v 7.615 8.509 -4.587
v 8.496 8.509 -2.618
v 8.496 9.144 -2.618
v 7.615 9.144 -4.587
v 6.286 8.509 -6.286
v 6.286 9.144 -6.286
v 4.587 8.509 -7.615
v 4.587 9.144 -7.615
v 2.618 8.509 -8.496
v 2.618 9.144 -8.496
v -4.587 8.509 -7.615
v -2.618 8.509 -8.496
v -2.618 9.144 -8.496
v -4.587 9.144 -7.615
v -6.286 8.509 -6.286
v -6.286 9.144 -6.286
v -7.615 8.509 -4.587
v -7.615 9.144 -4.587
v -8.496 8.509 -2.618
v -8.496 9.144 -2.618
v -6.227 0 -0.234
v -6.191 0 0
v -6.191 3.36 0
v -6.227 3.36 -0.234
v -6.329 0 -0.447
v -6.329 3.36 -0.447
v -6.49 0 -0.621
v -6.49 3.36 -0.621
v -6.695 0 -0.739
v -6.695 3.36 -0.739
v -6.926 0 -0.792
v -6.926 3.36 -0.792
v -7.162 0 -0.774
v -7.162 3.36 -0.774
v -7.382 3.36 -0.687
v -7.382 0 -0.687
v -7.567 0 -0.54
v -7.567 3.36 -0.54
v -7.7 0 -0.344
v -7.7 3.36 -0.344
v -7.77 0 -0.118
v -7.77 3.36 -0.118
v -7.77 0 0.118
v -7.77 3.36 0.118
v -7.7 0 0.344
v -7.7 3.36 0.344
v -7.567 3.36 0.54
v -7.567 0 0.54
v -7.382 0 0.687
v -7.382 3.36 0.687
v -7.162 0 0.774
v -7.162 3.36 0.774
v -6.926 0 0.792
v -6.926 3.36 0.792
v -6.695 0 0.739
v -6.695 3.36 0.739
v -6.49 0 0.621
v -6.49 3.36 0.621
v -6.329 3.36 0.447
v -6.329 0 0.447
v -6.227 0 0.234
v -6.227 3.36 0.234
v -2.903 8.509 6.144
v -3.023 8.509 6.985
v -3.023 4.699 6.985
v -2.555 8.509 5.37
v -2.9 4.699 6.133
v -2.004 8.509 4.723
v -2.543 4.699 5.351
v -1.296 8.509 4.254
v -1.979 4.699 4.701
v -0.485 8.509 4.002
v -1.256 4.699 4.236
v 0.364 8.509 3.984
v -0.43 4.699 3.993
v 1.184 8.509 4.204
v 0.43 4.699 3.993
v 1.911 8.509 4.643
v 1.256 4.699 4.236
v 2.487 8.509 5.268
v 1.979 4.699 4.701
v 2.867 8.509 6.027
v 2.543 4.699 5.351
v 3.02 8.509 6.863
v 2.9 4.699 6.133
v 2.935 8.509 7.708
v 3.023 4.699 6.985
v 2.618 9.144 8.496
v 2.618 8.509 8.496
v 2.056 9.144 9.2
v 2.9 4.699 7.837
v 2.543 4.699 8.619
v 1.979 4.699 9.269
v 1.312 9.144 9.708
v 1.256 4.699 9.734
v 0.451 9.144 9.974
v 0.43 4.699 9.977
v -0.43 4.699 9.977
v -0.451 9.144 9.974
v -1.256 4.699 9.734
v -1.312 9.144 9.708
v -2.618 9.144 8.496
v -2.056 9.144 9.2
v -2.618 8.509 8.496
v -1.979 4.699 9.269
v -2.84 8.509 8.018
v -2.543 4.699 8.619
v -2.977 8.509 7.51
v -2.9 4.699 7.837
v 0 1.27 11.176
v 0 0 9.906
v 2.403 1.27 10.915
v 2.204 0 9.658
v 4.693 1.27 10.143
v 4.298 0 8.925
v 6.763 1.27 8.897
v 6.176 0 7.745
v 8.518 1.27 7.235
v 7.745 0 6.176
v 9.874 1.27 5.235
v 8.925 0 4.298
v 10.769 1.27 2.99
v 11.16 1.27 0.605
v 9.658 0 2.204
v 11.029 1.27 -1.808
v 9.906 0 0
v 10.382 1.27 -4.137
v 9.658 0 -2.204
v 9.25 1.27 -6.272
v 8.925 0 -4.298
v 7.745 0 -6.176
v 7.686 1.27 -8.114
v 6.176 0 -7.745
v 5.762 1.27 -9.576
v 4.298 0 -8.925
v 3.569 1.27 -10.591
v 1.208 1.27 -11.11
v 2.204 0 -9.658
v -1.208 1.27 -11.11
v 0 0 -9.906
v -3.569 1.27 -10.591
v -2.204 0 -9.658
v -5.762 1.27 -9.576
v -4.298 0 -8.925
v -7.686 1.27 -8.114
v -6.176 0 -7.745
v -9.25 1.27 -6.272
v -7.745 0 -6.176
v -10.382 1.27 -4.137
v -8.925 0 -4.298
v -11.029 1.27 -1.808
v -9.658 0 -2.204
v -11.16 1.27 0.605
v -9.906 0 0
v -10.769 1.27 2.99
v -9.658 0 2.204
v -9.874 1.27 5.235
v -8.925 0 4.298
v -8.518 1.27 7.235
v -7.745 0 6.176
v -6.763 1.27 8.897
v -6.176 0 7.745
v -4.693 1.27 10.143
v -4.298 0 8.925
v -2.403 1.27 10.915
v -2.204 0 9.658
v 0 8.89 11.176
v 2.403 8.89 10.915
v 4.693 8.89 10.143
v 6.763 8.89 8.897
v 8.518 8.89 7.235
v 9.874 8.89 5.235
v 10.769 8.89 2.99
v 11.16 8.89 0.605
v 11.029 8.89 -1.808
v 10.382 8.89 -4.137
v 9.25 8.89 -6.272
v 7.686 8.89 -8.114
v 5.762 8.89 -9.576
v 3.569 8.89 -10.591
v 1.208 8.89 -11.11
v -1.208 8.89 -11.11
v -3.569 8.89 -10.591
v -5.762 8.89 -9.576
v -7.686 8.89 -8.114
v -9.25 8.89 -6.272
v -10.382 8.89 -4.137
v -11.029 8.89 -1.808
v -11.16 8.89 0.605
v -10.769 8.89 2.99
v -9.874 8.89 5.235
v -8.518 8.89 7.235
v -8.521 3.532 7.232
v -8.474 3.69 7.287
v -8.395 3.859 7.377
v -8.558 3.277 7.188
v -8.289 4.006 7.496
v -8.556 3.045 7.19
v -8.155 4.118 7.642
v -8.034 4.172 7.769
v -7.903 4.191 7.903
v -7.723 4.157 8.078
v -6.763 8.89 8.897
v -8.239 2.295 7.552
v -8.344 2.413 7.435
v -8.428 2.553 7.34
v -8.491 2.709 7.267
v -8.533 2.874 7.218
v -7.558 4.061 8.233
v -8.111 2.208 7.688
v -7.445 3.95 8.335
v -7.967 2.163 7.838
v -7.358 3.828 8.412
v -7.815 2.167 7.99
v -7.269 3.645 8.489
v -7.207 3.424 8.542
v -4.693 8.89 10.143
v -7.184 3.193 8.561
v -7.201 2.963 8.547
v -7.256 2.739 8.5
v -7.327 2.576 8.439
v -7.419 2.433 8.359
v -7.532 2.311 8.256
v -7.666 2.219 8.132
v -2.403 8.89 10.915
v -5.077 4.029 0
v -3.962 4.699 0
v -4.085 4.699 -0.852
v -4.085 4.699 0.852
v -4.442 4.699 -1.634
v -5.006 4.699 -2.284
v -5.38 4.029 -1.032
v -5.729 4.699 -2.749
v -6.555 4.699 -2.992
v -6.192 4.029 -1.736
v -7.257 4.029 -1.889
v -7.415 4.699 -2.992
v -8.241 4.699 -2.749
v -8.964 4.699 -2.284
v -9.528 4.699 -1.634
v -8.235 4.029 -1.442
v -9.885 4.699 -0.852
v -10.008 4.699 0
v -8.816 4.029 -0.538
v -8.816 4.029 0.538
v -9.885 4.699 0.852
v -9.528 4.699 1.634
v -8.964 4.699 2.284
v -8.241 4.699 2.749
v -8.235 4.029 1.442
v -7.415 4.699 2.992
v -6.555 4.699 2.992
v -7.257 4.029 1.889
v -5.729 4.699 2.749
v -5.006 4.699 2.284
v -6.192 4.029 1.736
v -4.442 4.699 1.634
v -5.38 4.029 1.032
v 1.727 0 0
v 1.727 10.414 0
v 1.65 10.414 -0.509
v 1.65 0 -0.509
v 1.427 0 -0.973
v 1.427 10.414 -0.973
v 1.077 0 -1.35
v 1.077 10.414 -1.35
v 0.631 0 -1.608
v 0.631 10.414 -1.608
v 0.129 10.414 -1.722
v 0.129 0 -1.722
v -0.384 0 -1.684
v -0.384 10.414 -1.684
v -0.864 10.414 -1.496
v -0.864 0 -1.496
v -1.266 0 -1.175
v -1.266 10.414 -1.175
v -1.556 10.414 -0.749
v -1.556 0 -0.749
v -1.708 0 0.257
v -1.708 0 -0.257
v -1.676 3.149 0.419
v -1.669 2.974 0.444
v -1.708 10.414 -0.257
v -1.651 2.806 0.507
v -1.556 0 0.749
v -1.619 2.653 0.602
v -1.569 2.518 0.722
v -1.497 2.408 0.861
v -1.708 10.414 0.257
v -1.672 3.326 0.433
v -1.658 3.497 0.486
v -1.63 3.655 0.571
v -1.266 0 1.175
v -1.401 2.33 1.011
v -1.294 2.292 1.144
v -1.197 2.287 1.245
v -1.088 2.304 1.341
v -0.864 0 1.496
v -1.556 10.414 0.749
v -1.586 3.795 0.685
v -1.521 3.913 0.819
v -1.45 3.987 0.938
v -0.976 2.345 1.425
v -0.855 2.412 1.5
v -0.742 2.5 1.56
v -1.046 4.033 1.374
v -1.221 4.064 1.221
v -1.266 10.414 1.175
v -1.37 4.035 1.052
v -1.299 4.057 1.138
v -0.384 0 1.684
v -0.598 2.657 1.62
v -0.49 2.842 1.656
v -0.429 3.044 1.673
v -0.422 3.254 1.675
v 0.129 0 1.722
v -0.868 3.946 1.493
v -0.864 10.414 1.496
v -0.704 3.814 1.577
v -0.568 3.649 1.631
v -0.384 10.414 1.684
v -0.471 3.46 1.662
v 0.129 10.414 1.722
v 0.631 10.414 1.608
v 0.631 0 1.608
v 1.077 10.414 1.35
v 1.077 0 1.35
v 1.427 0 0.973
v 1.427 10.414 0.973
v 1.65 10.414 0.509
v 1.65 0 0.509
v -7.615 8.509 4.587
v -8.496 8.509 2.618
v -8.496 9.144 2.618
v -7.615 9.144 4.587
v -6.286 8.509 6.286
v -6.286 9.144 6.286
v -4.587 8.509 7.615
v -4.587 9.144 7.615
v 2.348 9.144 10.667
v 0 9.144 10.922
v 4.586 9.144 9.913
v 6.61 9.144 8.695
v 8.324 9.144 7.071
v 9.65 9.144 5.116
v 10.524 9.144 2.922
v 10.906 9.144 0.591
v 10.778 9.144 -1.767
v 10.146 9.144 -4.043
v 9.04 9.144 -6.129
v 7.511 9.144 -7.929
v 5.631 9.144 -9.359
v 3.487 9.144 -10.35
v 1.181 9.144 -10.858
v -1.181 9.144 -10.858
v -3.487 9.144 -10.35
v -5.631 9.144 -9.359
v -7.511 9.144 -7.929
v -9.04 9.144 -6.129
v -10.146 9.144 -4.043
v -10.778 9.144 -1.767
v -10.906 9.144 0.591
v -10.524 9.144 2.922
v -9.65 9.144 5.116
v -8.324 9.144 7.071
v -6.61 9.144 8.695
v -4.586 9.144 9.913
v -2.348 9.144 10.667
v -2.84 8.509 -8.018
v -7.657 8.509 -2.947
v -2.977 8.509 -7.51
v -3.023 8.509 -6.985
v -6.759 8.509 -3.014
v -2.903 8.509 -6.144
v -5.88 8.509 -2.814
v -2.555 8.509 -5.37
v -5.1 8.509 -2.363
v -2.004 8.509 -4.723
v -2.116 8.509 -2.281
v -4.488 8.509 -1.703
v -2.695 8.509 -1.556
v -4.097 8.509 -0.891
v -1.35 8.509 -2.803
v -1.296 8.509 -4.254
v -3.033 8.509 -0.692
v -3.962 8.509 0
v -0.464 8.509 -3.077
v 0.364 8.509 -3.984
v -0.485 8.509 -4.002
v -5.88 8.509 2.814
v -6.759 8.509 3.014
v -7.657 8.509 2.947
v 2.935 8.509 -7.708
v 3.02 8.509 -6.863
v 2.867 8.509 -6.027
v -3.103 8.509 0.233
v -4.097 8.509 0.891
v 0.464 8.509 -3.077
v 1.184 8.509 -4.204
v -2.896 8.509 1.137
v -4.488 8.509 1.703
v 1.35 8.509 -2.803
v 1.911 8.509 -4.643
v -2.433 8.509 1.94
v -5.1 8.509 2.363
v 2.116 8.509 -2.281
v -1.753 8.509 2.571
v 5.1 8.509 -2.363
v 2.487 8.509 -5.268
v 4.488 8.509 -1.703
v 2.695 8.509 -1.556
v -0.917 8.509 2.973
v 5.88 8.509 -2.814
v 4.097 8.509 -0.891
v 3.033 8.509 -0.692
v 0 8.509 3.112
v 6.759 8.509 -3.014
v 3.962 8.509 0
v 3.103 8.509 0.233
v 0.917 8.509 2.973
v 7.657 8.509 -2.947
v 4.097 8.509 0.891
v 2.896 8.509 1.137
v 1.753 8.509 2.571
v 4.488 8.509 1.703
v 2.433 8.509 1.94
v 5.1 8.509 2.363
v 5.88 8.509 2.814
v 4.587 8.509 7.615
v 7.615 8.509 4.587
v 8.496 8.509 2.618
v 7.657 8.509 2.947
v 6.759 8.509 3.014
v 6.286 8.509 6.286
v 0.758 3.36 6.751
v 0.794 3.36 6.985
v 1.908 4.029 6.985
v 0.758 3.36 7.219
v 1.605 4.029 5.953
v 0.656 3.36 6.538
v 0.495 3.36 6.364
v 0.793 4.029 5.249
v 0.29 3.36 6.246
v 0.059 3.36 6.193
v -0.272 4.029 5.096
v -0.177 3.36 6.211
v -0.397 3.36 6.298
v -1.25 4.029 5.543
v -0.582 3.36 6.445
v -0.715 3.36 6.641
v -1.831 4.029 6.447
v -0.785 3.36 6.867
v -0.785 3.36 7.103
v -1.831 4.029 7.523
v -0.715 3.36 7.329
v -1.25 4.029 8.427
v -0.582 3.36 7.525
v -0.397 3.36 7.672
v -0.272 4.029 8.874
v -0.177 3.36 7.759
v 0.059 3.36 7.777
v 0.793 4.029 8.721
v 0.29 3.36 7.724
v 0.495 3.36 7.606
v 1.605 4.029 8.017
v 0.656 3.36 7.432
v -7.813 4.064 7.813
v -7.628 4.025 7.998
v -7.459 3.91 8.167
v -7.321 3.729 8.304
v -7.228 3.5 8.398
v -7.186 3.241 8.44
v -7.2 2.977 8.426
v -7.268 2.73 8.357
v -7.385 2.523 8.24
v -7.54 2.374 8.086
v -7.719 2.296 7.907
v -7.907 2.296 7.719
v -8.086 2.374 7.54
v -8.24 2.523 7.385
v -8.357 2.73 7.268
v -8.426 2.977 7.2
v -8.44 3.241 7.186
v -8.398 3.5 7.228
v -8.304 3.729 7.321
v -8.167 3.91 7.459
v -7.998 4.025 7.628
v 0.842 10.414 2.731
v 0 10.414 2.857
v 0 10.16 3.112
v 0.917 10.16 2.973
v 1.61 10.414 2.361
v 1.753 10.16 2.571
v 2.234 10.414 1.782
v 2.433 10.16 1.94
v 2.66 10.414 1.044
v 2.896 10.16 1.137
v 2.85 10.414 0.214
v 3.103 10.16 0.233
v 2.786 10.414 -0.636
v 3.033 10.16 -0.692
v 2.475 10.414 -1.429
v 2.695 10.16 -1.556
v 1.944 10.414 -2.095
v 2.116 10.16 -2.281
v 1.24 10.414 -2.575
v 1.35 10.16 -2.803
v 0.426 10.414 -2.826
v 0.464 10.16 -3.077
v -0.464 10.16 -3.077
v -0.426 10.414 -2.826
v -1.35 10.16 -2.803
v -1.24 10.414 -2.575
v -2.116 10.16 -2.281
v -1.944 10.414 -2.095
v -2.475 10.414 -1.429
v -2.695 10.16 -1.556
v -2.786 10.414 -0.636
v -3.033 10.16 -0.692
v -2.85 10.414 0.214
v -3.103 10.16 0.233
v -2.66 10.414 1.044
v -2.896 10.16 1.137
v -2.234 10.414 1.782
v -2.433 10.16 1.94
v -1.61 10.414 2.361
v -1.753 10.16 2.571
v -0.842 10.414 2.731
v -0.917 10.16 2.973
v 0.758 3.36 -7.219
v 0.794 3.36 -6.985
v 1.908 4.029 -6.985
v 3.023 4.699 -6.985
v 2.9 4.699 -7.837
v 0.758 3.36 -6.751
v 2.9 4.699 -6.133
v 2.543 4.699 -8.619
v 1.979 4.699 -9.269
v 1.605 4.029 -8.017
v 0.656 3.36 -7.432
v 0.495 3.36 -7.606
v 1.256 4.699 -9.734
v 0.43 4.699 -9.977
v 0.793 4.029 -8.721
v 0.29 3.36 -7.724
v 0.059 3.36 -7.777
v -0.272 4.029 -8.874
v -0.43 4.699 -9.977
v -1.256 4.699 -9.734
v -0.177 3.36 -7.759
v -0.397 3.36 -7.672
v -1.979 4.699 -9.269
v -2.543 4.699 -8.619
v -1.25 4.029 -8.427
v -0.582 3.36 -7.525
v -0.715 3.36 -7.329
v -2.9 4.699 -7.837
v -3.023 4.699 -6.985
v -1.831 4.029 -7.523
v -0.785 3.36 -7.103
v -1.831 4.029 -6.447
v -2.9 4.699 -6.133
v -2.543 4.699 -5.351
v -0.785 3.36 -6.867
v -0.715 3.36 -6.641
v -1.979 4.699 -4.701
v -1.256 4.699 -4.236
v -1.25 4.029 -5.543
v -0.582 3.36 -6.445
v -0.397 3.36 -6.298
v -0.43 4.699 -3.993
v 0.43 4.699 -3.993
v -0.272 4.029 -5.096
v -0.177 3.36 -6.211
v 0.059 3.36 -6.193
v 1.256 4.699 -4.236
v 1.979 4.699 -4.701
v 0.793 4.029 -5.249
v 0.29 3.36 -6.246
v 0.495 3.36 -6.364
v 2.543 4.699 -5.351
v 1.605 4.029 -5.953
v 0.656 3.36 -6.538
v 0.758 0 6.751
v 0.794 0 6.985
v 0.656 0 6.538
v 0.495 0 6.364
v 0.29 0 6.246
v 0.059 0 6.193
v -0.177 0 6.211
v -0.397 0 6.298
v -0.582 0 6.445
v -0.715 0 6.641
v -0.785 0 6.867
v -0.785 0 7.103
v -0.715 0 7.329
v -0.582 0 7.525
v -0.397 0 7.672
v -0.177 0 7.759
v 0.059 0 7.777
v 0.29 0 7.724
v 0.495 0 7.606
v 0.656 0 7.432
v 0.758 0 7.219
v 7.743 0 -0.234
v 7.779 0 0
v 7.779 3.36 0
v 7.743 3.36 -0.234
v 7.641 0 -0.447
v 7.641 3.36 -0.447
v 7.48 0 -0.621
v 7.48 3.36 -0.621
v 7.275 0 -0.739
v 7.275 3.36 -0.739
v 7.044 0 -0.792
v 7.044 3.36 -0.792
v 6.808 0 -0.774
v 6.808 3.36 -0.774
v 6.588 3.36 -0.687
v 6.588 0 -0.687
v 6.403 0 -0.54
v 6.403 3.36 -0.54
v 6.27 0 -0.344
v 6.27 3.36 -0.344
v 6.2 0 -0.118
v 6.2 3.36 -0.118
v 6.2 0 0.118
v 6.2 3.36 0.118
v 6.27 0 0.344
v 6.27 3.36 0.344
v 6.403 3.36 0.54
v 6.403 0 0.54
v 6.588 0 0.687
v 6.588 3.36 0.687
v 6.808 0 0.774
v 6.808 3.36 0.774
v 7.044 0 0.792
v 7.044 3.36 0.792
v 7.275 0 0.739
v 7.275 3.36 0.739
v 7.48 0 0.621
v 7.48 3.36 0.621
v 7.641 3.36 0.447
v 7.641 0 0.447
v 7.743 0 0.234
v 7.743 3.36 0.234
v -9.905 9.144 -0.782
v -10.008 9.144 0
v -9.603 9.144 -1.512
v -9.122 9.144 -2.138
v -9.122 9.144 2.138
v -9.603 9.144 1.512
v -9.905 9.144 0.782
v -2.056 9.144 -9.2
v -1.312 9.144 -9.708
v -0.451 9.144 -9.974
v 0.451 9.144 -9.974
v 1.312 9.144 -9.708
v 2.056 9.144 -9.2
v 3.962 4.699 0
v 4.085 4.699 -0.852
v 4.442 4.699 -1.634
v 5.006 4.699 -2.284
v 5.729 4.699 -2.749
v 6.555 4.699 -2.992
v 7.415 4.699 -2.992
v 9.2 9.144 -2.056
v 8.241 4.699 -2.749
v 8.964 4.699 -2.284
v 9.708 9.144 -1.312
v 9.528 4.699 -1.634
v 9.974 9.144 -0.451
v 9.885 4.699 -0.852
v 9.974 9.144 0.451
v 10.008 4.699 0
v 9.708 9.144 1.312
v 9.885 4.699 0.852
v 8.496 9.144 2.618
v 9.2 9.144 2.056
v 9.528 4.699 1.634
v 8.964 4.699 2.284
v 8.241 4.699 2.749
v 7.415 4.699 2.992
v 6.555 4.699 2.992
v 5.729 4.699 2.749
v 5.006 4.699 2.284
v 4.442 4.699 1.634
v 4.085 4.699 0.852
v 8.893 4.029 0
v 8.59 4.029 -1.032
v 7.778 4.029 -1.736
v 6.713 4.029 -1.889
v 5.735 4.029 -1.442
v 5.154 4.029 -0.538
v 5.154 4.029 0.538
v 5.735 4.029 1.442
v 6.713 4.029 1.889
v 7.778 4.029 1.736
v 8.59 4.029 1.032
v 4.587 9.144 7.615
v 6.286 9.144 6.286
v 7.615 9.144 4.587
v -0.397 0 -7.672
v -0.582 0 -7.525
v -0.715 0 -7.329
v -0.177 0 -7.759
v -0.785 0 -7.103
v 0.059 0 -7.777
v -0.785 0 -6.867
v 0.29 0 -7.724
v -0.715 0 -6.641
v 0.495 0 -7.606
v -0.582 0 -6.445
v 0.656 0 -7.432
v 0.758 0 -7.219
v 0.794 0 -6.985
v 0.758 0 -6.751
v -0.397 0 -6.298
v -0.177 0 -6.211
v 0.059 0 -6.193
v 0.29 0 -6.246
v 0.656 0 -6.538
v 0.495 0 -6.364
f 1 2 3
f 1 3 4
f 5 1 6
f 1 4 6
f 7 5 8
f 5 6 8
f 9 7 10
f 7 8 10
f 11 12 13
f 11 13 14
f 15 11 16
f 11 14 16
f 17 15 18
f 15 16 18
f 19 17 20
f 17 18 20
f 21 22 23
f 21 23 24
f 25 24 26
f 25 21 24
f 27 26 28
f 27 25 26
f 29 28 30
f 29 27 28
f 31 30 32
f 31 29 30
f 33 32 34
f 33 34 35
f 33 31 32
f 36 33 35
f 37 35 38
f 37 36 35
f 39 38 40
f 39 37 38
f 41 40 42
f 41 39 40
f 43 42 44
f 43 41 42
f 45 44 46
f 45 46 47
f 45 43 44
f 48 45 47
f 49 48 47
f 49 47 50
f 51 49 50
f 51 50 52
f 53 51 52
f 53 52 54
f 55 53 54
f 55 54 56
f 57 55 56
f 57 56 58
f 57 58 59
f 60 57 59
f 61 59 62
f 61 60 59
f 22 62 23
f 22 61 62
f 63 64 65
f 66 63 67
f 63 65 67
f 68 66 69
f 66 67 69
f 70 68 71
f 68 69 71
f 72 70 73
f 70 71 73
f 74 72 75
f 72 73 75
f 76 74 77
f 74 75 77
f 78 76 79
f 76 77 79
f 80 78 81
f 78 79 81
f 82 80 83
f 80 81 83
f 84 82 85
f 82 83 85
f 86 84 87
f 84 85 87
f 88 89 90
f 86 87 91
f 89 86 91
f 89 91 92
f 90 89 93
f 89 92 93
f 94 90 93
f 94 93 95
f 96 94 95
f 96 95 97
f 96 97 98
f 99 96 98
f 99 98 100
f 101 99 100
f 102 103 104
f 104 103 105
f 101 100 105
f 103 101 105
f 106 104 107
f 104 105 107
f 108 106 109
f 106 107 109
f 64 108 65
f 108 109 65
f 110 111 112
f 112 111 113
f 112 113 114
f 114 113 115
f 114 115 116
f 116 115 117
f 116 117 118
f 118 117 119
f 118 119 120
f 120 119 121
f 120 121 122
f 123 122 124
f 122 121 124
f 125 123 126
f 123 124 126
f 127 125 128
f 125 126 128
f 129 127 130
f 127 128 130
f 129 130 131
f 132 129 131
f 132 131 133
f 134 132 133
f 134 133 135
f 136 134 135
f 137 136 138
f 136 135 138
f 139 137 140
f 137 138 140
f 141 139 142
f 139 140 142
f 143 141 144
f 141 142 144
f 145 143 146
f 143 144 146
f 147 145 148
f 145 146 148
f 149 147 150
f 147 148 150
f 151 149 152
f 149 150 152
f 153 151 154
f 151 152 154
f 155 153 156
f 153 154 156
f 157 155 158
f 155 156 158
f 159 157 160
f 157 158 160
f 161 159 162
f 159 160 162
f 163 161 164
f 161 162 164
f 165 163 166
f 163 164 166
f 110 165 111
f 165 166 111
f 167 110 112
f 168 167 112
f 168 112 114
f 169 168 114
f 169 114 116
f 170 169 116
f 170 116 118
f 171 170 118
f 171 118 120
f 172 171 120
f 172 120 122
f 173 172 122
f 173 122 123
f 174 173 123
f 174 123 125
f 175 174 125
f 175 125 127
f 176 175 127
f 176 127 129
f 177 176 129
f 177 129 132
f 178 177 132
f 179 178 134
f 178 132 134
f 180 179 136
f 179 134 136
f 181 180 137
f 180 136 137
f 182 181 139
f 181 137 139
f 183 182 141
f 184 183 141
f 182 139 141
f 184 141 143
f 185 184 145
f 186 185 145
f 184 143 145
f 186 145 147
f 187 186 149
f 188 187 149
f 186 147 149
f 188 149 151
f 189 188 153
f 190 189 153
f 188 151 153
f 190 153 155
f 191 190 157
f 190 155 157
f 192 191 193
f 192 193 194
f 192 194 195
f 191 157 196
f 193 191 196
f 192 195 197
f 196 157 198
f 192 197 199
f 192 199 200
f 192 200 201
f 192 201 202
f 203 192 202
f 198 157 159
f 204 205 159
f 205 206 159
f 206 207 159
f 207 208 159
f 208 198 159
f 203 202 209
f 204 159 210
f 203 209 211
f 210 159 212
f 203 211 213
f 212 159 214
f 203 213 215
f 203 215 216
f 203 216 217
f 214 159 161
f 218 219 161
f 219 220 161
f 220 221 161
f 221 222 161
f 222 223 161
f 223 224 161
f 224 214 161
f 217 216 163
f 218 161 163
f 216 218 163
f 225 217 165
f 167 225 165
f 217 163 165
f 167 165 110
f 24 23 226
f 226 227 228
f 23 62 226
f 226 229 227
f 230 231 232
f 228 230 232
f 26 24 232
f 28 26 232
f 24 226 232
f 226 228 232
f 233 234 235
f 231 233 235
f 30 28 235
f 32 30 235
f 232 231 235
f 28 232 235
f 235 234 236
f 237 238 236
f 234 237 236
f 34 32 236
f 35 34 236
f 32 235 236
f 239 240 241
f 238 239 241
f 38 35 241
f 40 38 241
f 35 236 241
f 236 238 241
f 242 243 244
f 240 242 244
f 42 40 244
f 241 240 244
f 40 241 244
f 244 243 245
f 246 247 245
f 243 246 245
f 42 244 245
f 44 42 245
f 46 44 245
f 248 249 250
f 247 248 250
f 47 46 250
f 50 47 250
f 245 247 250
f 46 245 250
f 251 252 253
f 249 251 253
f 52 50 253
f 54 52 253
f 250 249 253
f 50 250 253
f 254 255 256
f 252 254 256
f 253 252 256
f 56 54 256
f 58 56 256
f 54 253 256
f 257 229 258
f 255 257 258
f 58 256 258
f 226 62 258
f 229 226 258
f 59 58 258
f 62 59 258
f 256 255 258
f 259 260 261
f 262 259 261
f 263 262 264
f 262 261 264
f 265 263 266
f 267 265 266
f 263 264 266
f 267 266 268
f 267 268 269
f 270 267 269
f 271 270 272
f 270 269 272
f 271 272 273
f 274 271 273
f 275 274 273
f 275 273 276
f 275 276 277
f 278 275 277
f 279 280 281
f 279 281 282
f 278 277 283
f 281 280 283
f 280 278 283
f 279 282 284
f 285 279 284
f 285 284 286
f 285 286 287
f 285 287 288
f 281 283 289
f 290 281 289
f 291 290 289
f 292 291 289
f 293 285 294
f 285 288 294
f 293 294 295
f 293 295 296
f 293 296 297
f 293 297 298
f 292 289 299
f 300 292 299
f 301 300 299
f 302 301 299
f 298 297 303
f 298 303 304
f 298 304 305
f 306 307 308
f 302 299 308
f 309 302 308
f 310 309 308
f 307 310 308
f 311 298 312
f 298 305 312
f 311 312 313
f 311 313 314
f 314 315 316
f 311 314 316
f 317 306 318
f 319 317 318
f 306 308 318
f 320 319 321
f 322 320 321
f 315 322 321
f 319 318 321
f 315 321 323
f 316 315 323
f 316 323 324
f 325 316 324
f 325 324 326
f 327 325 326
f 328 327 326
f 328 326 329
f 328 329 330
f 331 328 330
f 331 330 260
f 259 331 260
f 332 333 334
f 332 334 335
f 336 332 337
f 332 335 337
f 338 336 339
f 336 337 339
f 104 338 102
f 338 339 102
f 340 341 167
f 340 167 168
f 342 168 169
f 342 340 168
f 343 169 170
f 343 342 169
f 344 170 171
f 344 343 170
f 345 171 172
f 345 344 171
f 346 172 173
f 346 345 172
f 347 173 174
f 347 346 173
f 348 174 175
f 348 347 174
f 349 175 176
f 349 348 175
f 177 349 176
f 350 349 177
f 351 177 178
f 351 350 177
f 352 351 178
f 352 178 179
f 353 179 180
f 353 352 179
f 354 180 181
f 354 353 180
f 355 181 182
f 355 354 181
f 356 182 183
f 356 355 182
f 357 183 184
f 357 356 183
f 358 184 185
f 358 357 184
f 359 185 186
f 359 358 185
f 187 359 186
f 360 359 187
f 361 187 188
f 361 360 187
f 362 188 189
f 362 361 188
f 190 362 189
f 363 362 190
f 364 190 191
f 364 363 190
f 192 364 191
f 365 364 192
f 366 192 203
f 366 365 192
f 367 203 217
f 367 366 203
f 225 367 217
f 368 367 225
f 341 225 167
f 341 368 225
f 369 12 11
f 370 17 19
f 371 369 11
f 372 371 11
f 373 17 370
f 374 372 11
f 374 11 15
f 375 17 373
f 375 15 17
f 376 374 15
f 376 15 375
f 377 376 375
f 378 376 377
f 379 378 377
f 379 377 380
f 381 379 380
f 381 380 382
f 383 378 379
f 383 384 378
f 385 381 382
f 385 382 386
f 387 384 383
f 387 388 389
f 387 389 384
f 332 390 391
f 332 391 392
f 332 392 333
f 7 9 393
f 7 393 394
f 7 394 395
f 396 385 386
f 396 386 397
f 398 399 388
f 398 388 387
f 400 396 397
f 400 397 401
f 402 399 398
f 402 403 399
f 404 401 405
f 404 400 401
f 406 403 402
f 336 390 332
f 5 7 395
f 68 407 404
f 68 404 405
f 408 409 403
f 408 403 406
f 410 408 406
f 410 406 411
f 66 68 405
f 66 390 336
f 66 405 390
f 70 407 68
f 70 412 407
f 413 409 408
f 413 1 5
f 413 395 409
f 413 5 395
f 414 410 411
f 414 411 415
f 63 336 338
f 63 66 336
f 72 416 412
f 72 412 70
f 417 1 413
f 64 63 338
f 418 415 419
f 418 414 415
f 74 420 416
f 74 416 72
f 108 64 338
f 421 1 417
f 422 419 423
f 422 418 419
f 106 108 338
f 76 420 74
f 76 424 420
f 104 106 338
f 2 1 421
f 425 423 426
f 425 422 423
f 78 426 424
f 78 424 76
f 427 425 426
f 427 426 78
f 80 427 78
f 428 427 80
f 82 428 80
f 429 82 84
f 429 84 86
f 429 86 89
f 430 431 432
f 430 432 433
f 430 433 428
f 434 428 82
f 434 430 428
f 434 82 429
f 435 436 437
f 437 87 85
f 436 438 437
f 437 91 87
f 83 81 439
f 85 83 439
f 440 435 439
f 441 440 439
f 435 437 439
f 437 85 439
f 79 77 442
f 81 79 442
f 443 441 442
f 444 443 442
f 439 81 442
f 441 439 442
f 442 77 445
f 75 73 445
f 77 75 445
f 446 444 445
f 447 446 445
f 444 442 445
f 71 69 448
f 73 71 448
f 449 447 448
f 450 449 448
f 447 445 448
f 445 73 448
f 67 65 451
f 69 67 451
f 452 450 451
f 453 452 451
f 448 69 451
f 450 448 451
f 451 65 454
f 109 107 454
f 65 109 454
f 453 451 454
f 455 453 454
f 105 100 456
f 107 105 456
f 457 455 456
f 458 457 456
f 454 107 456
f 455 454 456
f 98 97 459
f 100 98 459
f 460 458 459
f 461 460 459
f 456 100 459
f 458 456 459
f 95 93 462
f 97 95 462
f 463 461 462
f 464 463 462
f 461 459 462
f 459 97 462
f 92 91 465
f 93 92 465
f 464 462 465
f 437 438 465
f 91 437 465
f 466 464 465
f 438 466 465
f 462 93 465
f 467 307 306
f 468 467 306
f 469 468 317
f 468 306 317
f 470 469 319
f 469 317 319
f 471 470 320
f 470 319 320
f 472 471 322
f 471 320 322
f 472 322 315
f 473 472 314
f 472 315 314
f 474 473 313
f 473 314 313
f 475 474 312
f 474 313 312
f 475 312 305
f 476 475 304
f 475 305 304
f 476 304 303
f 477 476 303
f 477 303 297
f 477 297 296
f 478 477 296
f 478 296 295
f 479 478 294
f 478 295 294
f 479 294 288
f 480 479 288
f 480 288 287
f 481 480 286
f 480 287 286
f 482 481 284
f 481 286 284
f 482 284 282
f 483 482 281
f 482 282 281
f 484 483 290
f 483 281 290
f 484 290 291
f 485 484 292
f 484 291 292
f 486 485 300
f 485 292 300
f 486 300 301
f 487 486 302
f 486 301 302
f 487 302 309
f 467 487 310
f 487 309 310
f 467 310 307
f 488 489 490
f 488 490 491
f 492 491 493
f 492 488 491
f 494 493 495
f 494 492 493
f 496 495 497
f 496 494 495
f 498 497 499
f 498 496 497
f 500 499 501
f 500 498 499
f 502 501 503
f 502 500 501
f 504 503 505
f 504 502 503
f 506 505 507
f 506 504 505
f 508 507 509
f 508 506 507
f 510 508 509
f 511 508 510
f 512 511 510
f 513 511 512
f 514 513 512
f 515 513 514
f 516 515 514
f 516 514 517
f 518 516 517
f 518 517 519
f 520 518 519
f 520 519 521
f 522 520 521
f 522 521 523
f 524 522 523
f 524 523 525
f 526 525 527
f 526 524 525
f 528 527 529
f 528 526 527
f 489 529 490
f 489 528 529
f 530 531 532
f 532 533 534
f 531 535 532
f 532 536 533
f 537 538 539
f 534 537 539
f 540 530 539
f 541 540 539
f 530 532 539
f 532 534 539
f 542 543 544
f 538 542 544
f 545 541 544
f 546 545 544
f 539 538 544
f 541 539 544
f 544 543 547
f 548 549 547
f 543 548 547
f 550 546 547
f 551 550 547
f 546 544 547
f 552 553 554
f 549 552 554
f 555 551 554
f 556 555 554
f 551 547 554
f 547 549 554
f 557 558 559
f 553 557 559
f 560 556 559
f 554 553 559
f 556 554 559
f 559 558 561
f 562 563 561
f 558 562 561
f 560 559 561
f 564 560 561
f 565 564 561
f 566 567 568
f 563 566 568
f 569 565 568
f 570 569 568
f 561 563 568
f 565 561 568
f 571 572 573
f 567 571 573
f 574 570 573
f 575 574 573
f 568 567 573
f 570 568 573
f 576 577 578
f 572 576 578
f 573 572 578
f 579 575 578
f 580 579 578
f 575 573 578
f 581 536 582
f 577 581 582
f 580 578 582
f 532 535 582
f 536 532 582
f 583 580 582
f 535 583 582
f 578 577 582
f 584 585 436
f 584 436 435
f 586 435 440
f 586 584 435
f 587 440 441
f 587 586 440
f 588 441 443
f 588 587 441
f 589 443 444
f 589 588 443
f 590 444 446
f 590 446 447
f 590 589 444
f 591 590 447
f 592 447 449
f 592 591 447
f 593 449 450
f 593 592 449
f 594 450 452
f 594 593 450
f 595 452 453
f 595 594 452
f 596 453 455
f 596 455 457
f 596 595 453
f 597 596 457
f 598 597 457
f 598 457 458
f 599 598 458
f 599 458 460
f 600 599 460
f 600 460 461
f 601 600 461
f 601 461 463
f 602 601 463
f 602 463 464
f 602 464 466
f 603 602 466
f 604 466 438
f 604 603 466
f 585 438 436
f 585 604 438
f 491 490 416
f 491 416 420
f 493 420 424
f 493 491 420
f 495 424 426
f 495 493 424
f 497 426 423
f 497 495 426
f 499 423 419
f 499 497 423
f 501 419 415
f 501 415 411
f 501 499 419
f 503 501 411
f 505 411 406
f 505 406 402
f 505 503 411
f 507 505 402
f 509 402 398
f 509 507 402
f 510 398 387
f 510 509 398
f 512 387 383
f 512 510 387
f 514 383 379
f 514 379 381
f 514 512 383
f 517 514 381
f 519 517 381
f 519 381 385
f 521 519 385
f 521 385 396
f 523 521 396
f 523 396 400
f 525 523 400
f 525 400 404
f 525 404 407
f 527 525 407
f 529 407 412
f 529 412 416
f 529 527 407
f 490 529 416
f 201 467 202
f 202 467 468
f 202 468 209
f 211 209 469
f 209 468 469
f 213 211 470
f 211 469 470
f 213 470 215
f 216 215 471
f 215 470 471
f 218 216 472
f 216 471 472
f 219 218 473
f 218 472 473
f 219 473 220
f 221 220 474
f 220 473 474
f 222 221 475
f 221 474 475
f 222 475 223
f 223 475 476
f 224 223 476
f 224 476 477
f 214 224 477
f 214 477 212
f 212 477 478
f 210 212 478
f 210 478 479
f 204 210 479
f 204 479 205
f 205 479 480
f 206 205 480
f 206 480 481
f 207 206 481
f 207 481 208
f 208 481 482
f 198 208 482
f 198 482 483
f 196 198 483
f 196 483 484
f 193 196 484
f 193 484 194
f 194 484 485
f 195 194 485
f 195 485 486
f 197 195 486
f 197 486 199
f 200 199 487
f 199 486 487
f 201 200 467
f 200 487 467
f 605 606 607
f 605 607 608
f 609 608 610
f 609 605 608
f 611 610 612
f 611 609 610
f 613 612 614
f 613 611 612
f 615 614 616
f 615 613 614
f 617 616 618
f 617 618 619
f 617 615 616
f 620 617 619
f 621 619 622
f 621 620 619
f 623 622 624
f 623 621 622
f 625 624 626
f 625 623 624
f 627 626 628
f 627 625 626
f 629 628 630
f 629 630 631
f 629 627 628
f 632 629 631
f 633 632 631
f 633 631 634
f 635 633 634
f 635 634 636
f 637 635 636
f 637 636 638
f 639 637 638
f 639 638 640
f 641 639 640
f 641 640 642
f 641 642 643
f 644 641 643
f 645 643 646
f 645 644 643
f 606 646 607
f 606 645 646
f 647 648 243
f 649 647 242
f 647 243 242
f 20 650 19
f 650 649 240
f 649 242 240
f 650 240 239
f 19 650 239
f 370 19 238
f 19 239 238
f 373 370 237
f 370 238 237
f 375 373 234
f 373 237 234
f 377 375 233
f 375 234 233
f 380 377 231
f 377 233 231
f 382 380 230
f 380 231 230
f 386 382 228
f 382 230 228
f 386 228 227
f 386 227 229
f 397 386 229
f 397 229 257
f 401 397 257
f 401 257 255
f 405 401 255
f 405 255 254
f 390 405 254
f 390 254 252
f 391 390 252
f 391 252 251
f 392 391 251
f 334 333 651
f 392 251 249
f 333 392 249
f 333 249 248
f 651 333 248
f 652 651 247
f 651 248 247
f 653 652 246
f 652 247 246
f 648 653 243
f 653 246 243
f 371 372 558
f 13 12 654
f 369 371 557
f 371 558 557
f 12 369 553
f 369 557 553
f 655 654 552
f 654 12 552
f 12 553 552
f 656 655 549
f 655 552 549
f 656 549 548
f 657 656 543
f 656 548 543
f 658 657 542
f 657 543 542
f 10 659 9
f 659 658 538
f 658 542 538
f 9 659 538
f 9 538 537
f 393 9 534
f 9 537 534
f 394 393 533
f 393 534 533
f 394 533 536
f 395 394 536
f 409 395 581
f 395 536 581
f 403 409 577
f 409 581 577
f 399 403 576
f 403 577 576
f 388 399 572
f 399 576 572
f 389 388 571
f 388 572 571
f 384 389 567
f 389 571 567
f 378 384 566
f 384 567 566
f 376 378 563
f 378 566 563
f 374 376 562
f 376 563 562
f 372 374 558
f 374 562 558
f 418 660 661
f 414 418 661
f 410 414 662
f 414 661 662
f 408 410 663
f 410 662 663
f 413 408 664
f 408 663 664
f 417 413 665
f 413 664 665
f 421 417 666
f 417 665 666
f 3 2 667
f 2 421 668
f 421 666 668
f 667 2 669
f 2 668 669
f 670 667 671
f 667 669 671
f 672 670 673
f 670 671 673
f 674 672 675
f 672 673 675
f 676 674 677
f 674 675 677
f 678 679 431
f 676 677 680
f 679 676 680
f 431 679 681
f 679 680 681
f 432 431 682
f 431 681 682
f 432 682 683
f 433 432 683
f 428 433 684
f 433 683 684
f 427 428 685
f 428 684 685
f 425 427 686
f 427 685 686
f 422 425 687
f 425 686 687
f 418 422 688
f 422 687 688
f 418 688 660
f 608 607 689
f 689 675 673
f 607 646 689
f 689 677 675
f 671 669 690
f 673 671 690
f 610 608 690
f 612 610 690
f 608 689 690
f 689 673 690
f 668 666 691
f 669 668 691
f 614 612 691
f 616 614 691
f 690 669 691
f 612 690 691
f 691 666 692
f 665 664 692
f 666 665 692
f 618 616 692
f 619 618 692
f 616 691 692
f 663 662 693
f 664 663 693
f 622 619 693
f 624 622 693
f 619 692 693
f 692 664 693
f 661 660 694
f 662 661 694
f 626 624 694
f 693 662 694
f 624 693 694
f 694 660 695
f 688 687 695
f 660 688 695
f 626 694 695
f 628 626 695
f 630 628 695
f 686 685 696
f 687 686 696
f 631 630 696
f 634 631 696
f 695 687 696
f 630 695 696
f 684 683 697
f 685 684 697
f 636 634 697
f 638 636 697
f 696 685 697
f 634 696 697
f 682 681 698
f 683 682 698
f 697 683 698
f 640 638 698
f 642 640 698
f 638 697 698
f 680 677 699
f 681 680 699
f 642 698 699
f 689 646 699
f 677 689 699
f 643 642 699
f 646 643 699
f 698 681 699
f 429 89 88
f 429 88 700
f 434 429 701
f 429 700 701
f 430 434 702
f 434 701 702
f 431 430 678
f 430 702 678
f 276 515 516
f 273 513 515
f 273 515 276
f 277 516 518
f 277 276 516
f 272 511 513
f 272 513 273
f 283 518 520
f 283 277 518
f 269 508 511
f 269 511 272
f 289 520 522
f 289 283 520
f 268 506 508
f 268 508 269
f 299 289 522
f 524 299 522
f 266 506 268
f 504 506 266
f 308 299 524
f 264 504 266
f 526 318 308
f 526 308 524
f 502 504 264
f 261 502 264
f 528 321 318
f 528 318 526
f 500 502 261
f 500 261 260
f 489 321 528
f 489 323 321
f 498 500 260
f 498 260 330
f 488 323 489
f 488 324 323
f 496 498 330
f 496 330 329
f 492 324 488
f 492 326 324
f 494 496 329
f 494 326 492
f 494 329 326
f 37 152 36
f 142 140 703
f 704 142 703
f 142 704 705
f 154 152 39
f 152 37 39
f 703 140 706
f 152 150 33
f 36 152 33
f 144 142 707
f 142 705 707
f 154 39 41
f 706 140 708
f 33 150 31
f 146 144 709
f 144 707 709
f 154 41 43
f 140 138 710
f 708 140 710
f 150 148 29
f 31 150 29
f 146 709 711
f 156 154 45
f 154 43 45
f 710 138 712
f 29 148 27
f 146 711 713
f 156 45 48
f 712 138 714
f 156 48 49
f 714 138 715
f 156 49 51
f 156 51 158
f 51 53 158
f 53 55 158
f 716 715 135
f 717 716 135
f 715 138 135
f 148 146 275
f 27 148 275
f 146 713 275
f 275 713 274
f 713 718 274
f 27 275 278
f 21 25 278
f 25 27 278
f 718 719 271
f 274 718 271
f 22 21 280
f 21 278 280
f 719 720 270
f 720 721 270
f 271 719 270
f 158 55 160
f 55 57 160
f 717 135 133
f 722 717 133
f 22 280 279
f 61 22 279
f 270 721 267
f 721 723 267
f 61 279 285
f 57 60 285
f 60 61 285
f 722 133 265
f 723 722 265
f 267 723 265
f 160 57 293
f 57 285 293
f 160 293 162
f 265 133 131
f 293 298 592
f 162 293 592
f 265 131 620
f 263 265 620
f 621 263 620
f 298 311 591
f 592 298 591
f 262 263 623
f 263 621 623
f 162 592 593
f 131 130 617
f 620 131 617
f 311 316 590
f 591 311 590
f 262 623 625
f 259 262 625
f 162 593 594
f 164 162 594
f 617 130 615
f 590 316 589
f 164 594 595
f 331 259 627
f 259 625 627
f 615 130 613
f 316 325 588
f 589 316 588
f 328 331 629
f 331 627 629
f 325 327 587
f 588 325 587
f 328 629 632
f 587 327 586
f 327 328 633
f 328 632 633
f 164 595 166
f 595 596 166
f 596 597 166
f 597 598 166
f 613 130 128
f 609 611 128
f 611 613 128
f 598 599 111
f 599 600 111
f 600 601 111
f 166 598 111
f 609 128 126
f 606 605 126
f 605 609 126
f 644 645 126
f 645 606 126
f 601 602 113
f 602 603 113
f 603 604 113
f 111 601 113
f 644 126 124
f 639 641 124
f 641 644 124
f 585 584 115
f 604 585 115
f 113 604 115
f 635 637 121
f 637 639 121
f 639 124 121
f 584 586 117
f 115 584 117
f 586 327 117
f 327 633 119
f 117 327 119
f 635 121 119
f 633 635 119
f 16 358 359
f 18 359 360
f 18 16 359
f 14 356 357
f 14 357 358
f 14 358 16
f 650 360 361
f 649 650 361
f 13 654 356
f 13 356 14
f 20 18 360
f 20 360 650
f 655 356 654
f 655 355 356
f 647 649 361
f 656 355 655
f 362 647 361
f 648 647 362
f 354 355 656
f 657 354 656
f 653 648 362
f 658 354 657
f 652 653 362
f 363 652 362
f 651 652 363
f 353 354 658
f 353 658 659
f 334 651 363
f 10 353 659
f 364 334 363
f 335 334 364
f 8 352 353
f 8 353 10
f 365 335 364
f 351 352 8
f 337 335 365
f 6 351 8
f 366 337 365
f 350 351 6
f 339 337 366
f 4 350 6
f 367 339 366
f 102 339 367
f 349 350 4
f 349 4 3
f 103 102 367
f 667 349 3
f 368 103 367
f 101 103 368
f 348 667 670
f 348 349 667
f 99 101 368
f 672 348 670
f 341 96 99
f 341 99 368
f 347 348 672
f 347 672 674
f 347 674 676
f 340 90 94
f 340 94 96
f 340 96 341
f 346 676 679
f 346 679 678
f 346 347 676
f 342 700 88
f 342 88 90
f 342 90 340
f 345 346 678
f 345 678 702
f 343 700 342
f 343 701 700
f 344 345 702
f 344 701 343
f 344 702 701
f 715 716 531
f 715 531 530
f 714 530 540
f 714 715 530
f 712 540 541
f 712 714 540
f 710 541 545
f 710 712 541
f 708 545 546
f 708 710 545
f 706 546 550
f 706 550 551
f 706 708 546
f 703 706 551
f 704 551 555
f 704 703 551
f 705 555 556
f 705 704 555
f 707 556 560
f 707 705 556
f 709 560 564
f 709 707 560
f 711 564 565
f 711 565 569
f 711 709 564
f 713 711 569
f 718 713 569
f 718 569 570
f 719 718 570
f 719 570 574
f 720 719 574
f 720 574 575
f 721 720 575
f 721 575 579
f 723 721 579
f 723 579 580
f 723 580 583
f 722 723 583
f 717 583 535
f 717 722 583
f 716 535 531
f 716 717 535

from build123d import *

# Parameters (mm, degrees)
SKETCH2_R                              = 11.176
BOSS_EXTRUDE1_DEPTH                    = 9.144
SKETCH3_R                              = 8.89
SKETCH3_R_2                            = 3.1115
CUT_EXTRUDE1_DEPTH                     = 0.635
CHAMFER1_SIZE                          = 0.254
CHAMFER2_SIZE                          = 1.27
BOSS_EXTRUDE2_START                    = 1.27
SKETCH10_R                             = 3.1115
SKETCH10_R_2                           = 1.5875
BOSS_EXTRUDE2_DEPTH                    = 1.27
CHAMFER3_SIZE                          = 0.254
F_2_56_TAPPED_HOLE3_D                  = 1.778
F_2_56_TAPPED_HOLE3_DEPTH              = 11.43
F_2_56_TAPPED_HOLE3_CSINK_D            = 2.54
F_2_56_TAPPED_HOLE3_CSINK_ANGLE        = 90
F_2_56_TAPPED_HOLE3_TIP                = 0.53416509
F_29_0_136_DIAMETER_HOLE1_D            = 3.4544
B_0_238_DIAMETER_HOLE1_D               = 6.0452
B_0_238_DIAMETER_HOLE1_DEPTH           = 4.445
B_0_238_DIAMETER_HOLE1_TIP             = 1.816161307
F_1_16_0_0625_DIAMETER_HOLE1_OUTLINE_R = 0.79375
F_1_16_0_0625_DIAMETER_HOLE1_DEPTH     = 3.359771909


# Read off the part's stored shape, not the designer's step: 1/16 (0.0625) Diameter Hole1
with BuildPart() as part:
    # Sketch2 → Boss-Extrude1 (new body)
    with BuildSketch(Plane(origin=(0, 0, 0), x_dir=(1, 0, 0), z_dir=(0, 1, 0))):
        with Locations(Location((0, 0, 0), (0, 0, 270))):
            Circle(SKETCH2_R)
    extrude(amount=BOSS_EXTRUDE1_DEPTH)

    # Sketch3 → Cut-Extrude1 (cut)
    with BuildSketch(Plane(origin=(0, 9.144, 0), x_dir=(1, 0, 0), z_dir=(0, 1, 0))):
        with Locations(Location((0, 0, 0), (0, 0, 270))):
            Circle(SKETCH3_R)
        with Locations(Location((0, 0, 0), (0, 0, 270))):
            Circle(SKETCH3_R_2, mode=Mode.SUBTRACT)
    extrude(amount=-CUT_EXTRUDE1_DEPTH, mode=Mode.SUBTRACT)

    # Chamfer1
    chamfer1_edges = [part.edges().sort_by_distance(p)[0] for p in [
        (0, 9.144, -11.176),
    ]]
    chamfer(chamfer1_edges, length=CHAMFER1_SIZE)

    # Chamfer2
    chamfer2_edges = [part.edges().sort_by_distance(p)[0] for p in [
        (0, 0, -11.176),
    ]]
    chamfer(chamfer2_edges, length=CHAMFER2_SIZE)

    # Sketch10 → Boss-Extrude2 (add)
    with BuildSketch(Plane(origin=(0, 9.144, 0), x_dir=(1, 0, 0), z_dir=(0, 1, 0)).offset(BOSS_EXTRUDE2_START)):
        with Locations(Location((0, 0, 0), (0, 0, 270))):
            Circle(SKETCH10_R)
        with Locations(Location((0, 0, 0), (0, 0, 270))):
            Circle(SKETCH10_R_2, mode=Mode.SUBTRACT)
    extrude(amount=-BOSS_EXTRUDE2_DEPTH)

    # Chamfer3
    chamfer3_edges = [part.edges().sort_by_distance(p)[0] for p in [
        (0, 10.414, -3.1115),
    ]]
    chamfer(chamfer3_edges, length=CHAMFER3_SIZE)

    # #2-56 Tapped Hole3
    with Locations(Plane(origin=(-8.082230509, 0, 8.082230509), x_dir=(0, -1, 0), z_dir=(-0.7071067811865488, 0, 0.7071067811865464))):
        with Locations((-3.175, 0)):
            CounterSinkHole(F_2_56_TAPPED_HOLE3_D / 2, F_2_56_TAPPED_HOLE3_CSINK_D / 2, depth=F_2_56_TAPPED_HOLE3_DEPTH, counter_sink_angle=F_2_56_TAPPED_HOLE3_CSINK_ANGLE)
            with Locations((0, 0, -(F_2_56_TAPPED_HOLE3_DEPTH + F_2_56_TAPPED_HOLE3_TIP / 2))):  # 118° drill point
                Cone(0, F_2_56_TAPPED_HOLE3_D / 2, F_2_56_TAPPED_HOLE3_TIP, mode=Mode.SUBTRACT)

    # #29 (0.136) Diameter Hole1 (through all)
    with Locations(Plane(origin=(0, 0, 0), x_dir=(-1, 0, 0), z_dir=(0, -1, 0))):
        with Locations((0, 0)):
            Hole(F_29_0_136_DIAMETER_HOLE1_D / 2)

    # B (0.238) Diameter Hole1
    with Locations(Plane(origin=(0, 9.144, 0), x_dir=(1, 0, 0), z_dir=(0, 1, 0))):
        with Locations((-6.985, 0), (0, 6.985), (0, -6.985), (6.985, 0)):
            Hole(B_0_238_DIAMETER_HOLE1_D / 2, depth=B_0_238_DIAMETER_HOLE1_DEPTH)
            with Locations((0, 0, -(B_0_238_DIAMETER_HOLE1_DEPTH + B_0_238_DIAMETER_HOLE1_TIP / 2))):  # 118° drill point
                Cone(0, B_0_238_DIAMETER_HOLE1_D / 2, B_0_238_DIAMETER_HOLE1_TIP, mode=Mode.SUBTRACT)

    # 1/16 (0.0625) Diameter Hole1 outline → 1/16 (0.0625) Diameter Hole1 (cut)
    with BuildSketch(Plane(origin=(0, 0, 0), x_dir=(1, 0, 0), z_dir=(0, 1, 0))):
        with Locations((-6.985, 0)):
            Circle(F_1_16_0_0625_DIAMETER_HOLE1_OUTLINE_R)
        with Locations((0, -6.985)):
            Circle(F_1_16_0_0625_DIAMETER_HOLE1_OUTLINE_R)
        with Locations((6.985, 0)):
            Circle(F_1_16_0_0625_DIAMETER_HOLE1_OUTLINE_R)
        with Locations((0, 6.985)):
            Circle(F_1_16_0_0625_DIAMETER_HOLE1_OUTLINE_R)
    extrude(amount=F_1_16_0_0625_DIAMETER_HOLE1_DEPTH, mode=Mode.SUBTRACT)


solid = part.part
